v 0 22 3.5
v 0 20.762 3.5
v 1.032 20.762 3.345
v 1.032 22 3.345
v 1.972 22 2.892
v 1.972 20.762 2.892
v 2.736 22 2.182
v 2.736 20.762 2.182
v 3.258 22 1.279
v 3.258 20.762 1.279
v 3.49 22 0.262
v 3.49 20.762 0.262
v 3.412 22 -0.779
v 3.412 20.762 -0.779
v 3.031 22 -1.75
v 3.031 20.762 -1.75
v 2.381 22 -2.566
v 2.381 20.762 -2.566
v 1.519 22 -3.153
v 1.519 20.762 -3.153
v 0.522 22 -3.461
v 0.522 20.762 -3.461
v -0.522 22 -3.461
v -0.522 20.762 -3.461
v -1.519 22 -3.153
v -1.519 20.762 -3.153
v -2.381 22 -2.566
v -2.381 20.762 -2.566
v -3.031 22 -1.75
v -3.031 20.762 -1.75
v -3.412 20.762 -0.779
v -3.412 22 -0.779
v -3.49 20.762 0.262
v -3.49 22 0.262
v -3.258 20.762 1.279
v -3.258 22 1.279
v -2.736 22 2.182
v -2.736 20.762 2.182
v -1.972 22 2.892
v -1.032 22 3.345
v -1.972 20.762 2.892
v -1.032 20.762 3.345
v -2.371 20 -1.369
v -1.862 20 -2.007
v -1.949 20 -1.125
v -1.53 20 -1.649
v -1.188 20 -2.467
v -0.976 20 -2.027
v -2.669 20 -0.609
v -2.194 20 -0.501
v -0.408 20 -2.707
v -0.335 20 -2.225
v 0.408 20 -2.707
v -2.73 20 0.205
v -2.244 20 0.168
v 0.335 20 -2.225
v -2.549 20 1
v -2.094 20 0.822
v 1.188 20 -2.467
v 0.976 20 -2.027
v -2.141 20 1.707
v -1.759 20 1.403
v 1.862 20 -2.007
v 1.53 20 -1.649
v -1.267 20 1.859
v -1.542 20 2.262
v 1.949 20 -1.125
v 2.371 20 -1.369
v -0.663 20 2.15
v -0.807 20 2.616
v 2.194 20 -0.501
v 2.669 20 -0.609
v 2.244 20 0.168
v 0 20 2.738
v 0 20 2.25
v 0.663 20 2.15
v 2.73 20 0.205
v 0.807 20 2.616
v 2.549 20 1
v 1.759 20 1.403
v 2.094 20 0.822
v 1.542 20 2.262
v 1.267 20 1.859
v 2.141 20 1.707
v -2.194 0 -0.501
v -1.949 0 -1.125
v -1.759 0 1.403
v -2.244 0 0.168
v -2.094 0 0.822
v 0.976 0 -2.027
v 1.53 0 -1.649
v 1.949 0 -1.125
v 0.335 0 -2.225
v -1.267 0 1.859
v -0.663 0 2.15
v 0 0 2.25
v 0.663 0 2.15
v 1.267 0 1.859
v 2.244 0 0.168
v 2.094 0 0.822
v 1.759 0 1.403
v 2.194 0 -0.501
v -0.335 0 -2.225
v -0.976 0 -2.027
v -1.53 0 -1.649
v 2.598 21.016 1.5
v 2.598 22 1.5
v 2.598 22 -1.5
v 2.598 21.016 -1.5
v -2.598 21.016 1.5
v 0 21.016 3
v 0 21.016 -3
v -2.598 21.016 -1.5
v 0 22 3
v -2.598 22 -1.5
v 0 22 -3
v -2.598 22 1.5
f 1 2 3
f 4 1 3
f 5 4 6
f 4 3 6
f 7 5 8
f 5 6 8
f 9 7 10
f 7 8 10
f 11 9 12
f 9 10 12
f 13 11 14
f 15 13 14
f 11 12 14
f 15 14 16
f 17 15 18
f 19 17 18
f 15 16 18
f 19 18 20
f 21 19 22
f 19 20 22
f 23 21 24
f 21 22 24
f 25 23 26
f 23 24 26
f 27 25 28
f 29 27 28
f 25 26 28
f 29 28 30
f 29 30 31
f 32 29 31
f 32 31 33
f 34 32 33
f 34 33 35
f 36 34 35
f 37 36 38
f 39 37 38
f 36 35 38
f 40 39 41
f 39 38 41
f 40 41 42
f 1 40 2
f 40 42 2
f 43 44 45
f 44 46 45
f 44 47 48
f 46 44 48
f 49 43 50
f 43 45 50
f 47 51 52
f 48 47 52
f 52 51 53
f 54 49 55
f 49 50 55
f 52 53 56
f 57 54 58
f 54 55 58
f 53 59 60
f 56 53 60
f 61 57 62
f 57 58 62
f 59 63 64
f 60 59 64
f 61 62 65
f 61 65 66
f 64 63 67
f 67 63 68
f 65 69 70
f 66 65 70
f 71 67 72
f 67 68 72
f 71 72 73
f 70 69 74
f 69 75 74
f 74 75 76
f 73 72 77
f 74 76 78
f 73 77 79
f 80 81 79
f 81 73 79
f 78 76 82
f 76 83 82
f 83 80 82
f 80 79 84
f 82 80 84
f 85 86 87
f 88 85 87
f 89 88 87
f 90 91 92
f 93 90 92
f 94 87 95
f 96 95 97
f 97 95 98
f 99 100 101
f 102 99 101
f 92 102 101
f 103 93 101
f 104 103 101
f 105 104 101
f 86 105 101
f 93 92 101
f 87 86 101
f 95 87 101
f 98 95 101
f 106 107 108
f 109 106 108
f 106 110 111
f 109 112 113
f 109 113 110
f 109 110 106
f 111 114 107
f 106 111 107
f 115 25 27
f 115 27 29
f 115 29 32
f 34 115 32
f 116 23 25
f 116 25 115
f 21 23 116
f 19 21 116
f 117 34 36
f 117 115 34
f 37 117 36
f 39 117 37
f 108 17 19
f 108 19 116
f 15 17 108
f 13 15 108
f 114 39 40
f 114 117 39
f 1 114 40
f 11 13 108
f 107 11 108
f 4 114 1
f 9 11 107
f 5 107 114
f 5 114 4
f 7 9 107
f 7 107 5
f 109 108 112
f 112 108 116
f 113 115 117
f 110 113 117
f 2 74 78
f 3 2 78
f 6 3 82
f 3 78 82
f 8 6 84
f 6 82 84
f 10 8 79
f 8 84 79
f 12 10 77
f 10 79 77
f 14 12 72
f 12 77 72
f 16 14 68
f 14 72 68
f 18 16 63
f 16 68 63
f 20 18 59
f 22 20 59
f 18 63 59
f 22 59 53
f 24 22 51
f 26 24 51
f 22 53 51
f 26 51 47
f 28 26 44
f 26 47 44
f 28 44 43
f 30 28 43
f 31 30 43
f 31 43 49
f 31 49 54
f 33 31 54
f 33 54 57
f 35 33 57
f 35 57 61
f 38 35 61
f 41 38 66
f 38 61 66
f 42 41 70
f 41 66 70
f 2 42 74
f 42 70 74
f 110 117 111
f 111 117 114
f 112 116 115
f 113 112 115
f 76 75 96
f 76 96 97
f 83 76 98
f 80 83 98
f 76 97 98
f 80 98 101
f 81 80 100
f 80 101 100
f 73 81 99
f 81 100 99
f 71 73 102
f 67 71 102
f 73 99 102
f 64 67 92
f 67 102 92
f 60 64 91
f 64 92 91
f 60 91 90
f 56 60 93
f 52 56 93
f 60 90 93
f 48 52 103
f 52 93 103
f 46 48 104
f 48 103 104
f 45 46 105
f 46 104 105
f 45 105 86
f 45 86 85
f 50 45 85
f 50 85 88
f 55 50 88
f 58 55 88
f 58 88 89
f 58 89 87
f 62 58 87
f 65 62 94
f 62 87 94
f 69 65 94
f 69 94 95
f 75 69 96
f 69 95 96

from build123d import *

# Parameters (mm, degrees)
SKETCH1_R      = 2.25
LENGTH_DEPTH   = 20
SKETCH2_R      = 3.5
CAP_DEPTH      = 2
CHAMFER_2_SIZE = 0.762
HEX_2_DEPTH    = 0.984


with BuildPart() as part:
    # Sketch1 → Length (new body)
    with BuildSketch(Plane(origin=(0, 0, 0), x_dir=(1, 0, 0), z_dir=(0, 1, 0))):
        with Locations(Location((0, 0, 0), (0, 0, 270))):
            Circle(SKETCH1_R)
    extrude(amount=LENGTH_DEPTH)

    # Sketch2 → Cap (add)
    with BuildSketch(Plane(origin=(0, 20, 0), x_dir=(1, 0, 0), z_dir=(0, 1, 0))):
        with Locations(Location((0, 0, 0), (0, 0, 270))):
            Circle(SKETCH2_R)
    extrude(amount=CAP_DEPTH)

    # Chamfer 2
    chamfer_2_edges = [part.edges().sort_by_distance(p)[0] for p in [
        (0, 20, -3.5),
    ]]
    chamfer(chamfer_2_edges, length=CHAMFER_2_SIZE)

    # Sketch3 → Hex 2 (cut)
    with BuildSketch(Plane(origin=(0, 22, 0), x_dir=(1, 0, 0), z_dir=(0, 1, 0))):
        Polygon((0, 3), (-2.598076211, 1.5), (-2.598076211, -1.5), (0, -3), (2.598076211, -1.5), (2.598076211, 1.5), align=None)
    extrude(amount=-HEX_2_DEPTH, mode=Mode.SUBTRACT)


solid = part.part
